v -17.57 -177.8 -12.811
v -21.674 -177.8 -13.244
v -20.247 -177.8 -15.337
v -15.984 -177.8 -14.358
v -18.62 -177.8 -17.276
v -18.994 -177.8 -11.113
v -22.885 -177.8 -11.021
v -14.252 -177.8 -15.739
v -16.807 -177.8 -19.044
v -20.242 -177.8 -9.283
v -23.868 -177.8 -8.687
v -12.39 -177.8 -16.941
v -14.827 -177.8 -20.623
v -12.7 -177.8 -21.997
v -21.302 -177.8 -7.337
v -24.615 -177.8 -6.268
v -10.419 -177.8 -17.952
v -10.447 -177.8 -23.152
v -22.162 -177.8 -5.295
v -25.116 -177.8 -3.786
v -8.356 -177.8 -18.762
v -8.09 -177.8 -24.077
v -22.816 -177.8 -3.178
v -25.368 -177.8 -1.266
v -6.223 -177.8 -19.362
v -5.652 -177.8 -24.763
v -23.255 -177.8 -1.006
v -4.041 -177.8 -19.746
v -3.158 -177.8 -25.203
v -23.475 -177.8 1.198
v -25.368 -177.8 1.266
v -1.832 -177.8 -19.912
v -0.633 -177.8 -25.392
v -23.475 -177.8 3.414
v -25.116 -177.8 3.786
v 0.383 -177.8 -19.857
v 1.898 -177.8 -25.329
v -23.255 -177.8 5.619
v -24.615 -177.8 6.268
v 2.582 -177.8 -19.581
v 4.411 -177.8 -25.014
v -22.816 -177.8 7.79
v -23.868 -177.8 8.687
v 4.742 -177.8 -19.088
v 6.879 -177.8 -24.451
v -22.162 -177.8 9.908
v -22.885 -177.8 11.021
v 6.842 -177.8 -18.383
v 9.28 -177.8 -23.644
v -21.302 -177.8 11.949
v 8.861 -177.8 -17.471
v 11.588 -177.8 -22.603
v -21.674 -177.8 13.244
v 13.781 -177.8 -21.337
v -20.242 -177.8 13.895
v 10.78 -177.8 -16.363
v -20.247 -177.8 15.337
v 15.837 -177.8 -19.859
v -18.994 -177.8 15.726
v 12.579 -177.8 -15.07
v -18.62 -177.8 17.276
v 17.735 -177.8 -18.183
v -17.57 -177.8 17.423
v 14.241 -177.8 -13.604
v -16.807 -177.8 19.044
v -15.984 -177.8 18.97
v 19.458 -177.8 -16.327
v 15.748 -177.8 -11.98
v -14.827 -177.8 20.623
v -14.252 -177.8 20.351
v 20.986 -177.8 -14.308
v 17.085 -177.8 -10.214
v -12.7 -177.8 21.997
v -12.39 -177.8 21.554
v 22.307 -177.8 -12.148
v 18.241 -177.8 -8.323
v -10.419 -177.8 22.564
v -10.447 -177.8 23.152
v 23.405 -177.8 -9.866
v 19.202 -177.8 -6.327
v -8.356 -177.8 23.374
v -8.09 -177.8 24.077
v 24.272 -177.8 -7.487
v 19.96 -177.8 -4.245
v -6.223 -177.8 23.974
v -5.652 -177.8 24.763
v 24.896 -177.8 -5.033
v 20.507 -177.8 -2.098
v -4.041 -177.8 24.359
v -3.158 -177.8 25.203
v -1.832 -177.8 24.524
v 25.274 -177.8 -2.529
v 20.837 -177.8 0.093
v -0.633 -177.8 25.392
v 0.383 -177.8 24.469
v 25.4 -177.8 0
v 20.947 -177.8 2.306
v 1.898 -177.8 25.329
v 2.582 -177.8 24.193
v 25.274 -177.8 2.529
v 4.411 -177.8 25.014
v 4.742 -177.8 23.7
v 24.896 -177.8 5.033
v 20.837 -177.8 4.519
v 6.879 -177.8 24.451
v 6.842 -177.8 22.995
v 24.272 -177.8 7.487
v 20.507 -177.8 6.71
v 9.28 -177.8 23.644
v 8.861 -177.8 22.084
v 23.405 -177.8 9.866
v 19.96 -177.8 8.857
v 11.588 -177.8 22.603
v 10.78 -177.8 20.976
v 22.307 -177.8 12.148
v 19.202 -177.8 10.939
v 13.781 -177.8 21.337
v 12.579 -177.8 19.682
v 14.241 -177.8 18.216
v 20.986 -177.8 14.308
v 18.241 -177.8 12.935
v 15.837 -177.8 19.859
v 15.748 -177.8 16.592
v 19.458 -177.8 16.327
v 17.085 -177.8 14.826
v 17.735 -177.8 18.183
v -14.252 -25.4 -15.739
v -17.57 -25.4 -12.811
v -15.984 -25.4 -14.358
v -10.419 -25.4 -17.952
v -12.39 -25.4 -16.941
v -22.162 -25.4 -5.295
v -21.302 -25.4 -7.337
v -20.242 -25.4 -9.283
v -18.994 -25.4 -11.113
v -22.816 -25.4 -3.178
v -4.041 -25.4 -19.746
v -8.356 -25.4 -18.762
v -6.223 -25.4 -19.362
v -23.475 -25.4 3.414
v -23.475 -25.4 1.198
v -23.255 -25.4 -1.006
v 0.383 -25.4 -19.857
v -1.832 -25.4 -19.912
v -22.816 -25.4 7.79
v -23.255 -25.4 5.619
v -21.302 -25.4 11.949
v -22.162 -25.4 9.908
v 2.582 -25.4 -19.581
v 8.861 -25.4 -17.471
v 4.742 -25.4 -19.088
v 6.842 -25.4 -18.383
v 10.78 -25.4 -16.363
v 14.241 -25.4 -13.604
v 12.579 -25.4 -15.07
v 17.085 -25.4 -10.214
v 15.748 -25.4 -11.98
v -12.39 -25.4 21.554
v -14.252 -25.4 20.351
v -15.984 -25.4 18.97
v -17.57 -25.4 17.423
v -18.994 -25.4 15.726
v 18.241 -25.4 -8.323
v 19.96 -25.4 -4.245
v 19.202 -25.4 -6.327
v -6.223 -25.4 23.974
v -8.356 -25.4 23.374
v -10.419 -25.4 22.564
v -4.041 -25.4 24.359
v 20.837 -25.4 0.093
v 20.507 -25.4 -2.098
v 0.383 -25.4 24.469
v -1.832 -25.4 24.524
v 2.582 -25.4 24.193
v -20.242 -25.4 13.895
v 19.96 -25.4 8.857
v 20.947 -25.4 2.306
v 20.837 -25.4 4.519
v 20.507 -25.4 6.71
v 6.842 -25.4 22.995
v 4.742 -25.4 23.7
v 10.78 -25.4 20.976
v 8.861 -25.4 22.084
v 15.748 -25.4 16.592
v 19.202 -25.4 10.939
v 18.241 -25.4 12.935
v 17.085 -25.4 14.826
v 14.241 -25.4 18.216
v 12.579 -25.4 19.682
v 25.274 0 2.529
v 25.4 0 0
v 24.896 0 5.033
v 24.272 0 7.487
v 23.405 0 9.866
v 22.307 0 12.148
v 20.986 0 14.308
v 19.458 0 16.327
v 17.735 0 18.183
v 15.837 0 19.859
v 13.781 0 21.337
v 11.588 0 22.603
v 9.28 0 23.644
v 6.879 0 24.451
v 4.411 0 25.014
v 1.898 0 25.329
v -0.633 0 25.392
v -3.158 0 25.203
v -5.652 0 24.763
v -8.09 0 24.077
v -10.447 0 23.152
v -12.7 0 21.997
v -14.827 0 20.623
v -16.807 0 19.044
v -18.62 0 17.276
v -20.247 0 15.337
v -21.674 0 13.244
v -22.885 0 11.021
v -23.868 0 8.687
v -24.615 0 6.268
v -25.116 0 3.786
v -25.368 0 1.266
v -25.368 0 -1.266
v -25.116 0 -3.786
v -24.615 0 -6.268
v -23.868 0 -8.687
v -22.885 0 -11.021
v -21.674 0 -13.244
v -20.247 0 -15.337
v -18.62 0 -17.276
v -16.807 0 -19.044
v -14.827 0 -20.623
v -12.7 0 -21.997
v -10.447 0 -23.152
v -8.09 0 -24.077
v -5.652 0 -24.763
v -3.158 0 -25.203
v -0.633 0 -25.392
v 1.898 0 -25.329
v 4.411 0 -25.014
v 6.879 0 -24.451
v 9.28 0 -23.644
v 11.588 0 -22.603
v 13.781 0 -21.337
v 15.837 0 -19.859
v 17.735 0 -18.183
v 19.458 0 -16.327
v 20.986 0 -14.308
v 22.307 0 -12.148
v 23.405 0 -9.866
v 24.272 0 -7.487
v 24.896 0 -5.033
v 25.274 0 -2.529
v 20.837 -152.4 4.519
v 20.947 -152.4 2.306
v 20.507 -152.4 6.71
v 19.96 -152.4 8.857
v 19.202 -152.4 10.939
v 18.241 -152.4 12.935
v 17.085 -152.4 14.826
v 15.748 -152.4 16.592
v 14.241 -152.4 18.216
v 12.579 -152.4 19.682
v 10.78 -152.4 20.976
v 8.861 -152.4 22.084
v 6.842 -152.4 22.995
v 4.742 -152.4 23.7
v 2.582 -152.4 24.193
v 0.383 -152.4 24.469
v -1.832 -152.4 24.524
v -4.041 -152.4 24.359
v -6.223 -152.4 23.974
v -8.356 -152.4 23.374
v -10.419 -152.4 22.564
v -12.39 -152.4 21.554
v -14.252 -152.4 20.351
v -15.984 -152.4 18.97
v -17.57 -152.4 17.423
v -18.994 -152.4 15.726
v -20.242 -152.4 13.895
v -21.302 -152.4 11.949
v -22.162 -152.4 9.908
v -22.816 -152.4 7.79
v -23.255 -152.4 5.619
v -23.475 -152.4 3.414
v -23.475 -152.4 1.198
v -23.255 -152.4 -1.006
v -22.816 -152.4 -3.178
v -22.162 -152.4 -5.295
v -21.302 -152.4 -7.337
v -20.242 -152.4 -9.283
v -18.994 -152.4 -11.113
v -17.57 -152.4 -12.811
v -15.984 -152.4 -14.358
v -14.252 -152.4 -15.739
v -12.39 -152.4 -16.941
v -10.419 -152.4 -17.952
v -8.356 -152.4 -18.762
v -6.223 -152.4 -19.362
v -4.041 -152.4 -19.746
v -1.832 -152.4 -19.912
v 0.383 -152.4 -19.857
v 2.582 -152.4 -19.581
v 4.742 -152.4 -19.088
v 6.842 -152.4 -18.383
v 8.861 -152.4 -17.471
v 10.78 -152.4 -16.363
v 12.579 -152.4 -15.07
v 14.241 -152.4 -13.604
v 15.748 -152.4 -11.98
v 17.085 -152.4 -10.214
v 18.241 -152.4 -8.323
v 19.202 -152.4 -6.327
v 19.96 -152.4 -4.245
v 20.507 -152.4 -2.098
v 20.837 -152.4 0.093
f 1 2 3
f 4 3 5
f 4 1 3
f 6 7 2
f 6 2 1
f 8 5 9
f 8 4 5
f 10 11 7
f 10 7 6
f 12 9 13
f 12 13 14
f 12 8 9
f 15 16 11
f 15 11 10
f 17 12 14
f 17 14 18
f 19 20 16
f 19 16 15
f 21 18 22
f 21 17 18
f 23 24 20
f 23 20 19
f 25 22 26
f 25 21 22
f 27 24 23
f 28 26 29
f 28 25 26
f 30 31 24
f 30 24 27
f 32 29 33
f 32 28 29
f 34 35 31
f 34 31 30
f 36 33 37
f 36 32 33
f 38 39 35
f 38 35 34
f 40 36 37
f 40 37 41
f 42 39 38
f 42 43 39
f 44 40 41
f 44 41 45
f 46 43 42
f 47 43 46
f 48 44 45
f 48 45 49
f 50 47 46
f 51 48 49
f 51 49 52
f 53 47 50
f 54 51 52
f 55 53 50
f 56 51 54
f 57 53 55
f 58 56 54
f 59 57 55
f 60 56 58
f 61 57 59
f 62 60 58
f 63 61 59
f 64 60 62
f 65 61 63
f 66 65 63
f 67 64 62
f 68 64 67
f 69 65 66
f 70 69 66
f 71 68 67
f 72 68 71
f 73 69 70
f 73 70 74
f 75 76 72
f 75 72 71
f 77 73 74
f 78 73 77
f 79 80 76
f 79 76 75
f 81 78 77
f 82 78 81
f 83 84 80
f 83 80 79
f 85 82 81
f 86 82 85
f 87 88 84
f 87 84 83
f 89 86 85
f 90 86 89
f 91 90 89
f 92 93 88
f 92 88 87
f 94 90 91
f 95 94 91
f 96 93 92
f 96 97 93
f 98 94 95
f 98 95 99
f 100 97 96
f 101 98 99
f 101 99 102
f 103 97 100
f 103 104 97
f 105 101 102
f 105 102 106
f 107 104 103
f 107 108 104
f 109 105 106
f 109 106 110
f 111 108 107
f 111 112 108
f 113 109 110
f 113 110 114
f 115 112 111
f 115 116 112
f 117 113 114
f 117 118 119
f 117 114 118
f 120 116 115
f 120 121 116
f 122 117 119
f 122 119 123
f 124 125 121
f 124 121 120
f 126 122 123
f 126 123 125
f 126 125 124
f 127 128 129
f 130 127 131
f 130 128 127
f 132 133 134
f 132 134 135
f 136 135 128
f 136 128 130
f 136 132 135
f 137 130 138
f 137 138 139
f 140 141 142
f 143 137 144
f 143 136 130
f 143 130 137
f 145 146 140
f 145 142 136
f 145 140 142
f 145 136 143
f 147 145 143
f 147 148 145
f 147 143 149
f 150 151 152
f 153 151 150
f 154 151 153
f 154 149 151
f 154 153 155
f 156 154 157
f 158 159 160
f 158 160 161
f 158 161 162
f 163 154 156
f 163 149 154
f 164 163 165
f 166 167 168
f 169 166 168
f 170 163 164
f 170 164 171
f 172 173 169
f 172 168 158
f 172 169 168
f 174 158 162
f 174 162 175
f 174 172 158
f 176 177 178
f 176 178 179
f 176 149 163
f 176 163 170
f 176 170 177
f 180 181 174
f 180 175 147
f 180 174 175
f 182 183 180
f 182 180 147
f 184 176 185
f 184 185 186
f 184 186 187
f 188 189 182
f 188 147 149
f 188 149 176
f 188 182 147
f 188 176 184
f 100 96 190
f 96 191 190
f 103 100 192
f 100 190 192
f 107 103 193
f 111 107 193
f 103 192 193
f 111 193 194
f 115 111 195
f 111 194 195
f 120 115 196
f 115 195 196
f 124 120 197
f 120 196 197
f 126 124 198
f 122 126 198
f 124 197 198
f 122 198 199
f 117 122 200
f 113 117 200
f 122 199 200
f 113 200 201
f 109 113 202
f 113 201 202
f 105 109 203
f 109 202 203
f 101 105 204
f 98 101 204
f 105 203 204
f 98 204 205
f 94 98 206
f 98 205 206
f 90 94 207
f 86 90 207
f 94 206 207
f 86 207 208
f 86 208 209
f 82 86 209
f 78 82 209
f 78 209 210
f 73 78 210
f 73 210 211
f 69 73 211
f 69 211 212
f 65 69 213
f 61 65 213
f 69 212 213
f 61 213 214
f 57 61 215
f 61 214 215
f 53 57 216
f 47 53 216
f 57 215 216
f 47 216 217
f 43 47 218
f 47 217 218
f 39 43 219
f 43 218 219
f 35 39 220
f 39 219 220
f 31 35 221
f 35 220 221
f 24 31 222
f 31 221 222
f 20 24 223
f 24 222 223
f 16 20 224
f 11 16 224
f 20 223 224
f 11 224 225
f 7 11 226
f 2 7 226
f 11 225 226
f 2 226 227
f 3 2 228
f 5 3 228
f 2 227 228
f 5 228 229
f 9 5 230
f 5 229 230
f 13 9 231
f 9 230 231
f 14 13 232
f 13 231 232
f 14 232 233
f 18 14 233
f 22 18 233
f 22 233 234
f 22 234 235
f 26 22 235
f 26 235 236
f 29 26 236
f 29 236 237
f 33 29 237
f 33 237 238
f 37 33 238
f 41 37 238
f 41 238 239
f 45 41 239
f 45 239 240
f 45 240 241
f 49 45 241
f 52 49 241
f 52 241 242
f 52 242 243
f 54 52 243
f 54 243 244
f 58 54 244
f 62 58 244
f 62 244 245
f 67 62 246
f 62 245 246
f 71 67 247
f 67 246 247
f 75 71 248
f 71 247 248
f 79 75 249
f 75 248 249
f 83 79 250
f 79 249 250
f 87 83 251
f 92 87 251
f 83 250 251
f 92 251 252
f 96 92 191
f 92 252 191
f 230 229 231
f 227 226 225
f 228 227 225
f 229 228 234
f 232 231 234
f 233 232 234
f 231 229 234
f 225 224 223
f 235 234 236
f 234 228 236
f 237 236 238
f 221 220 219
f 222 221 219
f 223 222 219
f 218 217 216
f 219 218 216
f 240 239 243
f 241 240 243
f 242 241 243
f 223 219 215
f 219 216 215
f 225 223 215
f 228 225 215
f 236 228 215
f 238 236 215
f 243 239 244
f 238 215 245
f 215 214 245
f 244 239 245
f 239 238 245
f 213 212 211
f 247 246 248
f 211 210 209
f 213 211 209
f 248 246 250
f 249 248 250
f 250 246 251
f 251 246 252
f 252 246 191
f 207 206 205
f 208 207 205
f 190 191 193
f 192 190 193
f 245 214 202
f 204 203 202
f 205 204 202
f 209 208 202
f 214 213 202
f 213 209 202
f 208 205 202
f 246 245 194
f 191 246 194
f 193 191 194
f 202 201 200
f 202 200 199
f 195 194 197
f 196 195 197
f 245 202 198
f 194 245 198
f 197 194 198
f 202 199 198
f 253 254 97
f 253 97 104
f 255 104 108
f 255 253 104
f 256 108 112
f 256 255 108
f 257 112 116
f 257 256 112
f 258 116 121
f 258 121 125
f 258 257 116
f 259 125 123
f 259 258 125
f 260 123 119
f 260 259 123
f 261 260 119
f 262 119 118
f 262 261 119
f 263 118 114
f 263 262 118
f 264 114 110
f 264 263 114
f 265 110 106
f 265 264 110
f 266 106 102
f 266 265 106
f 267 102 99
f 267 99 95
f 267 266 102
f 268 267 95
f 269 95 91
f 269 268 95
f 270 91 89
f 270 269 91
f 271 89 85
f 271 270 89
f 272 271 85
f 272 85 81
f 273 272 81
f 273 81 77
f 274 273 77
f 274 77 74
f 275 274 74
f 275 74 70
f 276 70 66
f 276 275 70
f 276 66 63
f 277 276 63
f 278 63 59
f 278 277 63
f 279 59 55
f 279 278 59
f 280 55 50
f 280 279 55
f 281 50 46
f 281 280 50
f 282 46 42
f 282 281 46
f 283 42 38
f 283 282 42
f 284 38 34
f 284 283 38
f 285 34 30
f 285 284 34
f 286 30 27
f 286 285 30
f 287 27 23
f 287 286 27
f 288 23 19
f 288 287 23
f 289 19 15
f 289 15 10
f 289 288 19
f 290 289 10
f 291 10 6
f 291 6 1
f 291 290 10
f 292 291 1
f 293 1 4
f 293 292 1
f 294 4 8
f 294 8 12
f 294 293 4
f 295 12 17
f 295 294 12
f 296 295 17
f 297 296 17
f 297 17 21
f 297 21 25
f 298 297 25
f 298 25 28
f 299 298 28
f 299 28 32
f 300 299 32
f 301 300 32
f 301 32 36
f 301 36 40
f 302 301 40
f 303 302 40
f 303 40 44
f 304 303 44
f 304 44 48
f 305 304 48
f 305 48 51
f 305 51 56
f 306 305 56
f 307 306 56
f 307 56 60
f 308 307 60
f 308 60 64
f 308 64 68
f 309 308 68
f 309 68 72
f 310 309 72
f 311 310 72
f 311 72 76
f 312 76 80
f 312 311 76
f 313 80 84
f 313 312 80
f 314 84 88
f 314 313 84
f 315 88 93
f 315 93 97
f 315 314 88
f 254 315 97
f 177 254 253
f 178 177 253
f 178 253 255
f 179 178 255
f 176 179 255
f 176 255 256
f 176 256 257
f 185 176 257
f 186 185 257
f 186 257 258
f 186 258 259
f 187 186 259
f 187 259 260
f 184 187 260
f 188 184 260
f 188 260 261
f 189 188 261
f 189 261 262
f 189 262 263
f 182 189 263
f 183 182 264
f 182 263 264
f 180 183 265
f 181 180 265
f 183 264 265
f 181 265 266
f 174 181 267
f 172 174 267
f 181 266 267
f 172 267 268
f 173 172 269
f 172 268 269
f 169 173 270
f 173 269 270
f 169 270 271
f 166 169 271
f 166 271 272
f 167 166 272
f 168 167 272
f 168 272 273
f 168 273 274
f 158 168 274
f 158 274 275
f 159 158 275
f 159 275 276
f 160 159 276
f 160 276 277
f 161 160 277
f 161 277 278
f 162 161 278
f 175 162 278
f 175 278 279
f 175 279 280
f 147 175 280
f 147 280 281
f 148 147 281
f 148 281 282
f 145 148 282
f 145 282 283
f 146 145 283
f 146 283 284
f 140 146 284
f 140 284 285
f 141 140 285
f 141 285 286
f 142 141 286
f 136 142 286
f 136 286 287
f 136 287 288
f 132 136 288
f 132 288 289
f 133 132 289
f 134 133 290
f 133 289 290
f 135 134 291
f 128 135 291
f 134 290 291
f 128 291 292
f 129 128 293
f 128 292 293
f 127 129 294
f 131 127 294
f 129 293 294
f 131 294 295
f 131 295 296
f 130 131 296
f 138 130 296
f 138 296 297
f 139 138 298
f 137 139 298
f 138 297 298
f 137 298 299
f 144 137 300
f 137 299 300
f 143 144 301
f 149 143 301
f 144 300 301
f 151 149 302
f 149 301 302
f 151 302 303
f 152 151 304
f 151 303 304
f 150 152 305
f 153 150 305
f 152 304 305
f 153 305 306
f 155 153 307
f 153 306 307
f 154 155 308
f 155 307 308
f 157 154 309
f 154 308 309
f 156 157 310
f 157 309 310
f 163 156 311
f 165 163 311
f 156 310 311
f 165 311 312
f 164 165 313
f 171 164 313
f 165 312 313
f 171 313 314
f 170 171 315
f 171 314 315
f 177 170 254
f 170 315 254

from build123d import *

# Parameters (mm, degrees)
F0_R     = 25.4
F1_DEPTH = 152.4
F2_R     = 22.225
F3_DEPTH = 146.05
F4_DEPTH = 25.4


with BuildPart() as f1:
    # F0 (on Front) → F1 (new body)
    with BuildSketch(Plane.XZ):
        Circle(F0_R)
    extrude(amount=F1_DEPTH)

    # F2 (on face) → F3 (cut)
    with BuildSketch(Plane.XZ.offset(152.4)):
        with Locations((-1.2778061209, 2.3061255924)):
            Circle(F2_R)
    extrude(amount=-F3_DEPTH, mode=Mode.SUBTRACT)

    # F4 (add): faces of the model
    f4_faces = [f1.faces().sort_by_distance(p)[0] for p in [
        (-24.6815795103, -152.4, 0),
        (0, 0, 0),
    ]]
    extrude(f4_faces, amount=F4_DEPTH, dir=(0, -1, 0))


solid = f1.part
